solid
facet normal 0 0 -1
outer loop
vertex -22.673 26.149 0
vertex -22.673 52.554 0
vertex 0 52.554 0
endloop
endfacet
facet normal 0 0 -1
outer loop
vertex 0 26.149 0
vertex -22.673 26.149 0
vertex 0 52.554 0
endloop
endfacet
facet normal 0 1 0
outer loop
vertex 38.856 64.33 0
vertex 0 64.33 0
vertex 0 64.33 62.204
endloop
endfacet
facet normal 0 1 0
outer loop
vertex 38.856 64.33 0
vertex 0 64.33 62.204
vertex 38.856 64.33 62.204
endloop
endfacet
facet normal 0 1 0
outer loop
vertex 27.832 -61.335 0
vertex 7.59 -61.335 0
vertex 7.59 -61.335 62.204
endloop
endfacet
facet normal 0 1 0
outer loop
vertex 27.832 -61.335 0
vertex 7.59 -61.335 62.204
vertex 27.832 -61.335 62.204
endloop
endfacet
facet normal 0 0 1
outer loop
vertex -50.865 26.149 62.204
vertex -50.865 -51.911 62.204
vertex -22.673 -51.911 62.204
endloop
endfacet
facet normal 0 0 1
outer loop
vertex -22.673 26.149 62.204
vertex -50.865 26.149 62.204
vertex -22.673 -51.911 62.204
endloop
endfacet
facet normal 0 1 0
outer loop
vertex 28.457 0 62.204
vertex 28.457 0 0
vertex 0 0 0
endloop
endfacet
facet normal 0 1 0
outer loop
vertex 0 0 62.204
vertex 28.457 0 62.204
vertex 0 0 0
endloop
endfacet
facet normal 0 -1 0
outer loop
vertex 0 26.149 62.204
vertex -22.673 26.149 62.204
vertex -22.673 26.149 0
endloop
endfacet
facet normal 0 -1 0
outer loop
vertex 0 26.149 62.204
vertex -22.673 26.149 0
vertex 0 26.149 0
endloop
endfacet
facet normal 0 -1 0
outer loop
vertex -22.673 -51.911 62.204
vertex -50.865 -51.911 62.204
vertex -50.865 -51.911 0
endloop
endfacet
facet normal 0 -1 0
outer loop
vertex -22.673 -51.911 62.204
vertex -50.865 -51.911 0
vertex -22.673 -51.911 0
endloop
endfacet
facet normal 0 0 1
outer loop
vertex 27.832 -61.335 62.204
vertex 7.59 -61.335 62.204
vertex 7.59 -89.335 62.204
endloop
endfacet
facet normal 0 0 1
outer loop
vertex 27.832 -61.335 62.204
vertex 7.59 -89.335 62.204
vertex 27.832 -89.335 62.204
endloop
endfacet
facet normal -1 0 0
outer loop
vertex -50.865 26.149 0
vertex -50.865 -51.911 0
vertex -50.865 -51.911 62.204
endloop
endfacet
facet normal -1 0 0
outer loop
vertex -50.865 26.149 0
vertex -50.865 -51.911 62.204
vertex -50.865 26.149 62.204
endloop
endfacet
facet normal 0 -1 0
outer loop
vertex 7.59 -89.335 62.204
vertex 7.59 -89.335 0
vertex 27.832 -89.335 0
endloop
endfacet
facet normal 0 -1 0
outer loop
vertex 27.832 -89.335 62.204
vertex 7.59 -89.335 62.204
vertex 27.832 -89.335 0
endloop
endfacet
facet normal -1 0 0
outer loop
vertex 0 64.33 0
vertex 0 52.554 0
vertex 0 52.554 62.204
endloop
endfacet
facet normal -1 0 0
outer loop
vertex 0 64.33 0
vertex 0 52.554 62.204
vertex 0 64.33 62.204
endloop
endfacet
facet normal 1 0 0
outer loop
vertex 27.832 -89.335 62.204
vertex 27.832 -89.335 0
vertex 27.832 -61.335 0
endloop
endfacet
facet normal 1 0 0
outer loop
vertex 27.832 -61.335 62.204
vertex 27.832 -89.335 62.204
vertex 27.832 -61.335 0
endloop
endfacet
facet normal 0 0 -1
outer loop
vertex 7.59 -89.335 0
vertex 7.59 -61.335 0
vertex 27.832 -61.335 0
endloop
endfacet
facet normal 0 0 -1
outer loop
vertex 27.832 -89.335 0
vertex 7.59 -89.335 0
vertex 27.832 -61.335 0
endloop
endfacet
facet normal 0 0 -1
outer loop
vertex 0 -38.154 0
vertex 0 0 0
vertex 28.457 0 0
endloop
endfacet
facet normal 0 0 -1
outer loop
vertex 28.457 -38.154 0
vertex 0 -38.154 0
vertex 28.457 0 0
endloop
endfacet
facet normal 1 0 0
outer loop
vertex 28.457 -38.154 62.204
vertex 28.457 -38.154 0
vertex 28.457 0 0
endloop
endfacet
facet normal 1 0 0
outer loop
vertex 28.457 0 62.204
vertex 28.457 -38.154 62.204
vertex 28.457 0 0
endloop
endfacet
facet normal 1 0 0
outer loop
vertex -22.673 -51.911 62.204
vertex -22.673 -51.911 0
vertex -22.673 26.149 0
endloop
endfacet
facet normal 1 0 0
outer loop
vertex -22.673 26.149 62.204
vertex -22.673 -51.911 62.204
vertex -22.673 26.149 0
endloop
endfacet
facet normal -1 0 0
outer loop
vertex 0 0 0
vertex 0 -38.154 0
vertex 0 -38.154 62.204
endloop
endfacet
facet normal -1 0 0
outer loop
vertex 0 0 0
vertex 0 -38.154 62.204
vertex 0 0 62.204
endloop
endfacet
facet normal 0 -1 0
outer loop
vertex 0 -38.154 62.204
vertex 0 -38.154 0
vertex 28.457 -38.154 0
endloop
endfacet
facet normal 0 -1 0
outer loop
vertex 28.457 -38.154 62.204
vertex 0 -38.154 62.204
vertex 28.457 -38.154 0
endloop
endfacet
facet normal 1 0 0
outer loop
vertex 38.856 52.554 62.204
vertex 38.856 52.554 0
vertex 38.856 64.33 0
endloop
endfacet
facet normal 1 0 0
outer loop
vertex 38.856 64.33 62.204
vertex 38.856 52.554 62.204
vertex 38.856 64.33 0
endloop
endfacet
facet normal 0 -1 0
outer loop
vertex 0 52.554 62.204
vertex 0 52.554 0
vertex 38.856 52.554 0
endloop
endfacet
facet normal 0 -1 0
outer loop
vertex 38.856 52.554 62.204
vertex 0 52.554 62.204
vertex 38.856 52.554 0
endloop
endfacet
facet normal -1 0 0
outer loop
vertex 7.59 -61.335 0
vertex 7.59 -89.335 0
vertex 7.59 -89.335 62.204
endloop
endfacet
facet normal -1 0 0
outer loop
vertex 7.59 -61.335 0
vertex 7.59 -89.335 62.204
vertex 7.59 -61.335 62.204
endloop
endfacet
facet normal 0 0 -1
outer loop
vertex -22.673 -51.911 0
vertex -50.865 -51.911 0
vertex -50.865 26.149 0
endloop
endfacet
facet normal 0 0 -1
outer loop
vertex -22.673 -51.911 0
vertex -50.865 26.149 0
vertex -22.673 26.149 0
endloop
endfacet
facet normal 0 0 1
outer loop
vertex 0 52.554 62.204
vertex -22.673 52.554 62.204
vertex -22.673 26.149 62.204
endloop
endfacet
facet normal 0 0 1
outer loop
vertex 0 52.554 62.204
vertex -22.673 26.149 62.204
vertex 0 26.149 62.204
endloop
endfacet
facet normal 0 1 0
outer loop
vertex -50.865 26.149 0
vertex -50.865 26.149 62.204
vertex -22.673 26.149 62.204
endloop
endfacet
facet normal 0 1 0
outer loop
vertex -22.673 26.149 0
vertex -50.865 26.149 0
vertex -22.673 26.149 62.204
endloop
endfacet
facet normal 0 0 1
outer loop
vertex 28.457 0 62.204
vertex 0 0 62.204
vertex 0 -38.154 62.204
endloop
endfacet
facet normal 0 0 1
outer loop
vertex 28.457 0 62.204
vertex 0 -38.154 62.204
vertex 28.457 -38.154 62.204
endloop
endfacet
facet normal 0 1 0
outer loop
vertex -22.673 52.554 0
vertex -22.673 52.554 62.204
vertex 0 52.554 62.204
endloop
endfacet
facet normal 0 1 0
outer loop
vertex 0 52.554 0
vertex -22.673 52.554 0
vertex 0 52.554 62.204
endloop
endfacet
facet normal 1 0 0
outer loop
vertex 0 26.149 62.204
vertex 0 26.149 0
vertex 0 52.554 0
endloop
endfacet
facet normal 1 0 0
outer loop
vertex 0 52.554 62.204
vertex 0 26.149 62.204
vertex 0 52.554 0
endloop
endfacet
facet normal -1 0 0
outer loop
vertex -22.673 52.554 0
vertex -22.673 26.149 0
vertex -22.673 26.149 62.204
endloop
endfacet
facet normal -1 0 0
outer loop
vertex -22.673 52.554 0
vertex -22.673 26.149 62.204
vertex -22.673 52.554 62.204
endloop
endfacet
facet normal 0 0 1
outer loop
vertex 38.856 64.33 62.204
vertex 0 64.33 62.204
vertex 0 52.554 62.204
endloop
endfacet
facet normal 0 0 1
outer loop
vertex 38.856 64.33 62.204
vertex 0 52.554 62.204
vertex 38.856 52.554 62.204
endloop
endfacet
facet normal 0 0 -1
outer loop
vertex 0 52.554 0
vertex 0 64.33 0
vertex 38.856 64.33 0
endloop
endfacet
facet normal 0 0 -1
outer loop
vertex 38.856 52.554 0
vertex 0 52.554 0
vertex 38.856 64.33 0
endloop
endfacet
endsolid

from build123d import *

# Parameters (mm, degrees)
F0_W     = 28.1920060515
F0_H     = 78.0604481697
F1_DEPTH = 62.2041933239
F0_W_2   = 22.672533989
F0_H_2   = 26.404581964
F0_W_3   = 38.8558357954
F0_H_3   = 11.7763727903
F0_W_4   = 22.1070865333
F0_H_4   = 38.1543785334
F0_W_5   = 6.35
F0_W_6   = 20.2417038381
F0_H_5   = 27.9998555779


with BuildPart() as f1:
    # F0 (on Top) → F1 (new body)
    with BuildSketch(Plane.XY):
        with Locations((-36.7685370147, -12.88125664)):
            Rectangle(F0_W, F0_H)
    extrude(amount=F1_DEPTH)


with BuildPart() as f1b:
    # F0 (on Top) → F1, piece 2 (new body)
    with BuildSketch(Plane.XY):
        with Locations((-11.3362669945, 39.3512584269)):
            Rectangle(F0_W_2, F0_H_2)
    extrude(amount=F1_DEPTH)


with BuildPart() as f1c:
    # F0 (on Top) → F1, piece 3 (new body)
    with BuildSketch(Plane.XY):
        with Locations((19.4279178977, 58.4417358041)):
            Rectangle(F0_W_3, F0_H_3)
    extrude(amount=F1_DEPTH)


with BuildPart() as f1d:
    # F0 (on Top) → F1, piece 4 (new body)
    with BuildSketch(Plane.XY):
        with Locations((11.0535432667, -19.0771892667)):
            Rectangle(F0_W_4, F0_H_4)
        with Locations((25.2820865333, -19.0771892667)):
            Rectangle(F0_W_5, F0_H_4)
    extrude(amount=F1_DEPTH)


with BuildPart() as f1e:
    # F0 (on Top) → F1, piece 5 (new body)
    with BuildSketch(Plane.XY):
        with Locations((17.7113395184, -75.3347910941)):
            Rectangle(F0_W_6, F0_H_5)
    extrude(amount=F1_DEPTH)


solid = Compound([f1.part, f1b.part, f1c.part, f1d.part, f1e.part])
